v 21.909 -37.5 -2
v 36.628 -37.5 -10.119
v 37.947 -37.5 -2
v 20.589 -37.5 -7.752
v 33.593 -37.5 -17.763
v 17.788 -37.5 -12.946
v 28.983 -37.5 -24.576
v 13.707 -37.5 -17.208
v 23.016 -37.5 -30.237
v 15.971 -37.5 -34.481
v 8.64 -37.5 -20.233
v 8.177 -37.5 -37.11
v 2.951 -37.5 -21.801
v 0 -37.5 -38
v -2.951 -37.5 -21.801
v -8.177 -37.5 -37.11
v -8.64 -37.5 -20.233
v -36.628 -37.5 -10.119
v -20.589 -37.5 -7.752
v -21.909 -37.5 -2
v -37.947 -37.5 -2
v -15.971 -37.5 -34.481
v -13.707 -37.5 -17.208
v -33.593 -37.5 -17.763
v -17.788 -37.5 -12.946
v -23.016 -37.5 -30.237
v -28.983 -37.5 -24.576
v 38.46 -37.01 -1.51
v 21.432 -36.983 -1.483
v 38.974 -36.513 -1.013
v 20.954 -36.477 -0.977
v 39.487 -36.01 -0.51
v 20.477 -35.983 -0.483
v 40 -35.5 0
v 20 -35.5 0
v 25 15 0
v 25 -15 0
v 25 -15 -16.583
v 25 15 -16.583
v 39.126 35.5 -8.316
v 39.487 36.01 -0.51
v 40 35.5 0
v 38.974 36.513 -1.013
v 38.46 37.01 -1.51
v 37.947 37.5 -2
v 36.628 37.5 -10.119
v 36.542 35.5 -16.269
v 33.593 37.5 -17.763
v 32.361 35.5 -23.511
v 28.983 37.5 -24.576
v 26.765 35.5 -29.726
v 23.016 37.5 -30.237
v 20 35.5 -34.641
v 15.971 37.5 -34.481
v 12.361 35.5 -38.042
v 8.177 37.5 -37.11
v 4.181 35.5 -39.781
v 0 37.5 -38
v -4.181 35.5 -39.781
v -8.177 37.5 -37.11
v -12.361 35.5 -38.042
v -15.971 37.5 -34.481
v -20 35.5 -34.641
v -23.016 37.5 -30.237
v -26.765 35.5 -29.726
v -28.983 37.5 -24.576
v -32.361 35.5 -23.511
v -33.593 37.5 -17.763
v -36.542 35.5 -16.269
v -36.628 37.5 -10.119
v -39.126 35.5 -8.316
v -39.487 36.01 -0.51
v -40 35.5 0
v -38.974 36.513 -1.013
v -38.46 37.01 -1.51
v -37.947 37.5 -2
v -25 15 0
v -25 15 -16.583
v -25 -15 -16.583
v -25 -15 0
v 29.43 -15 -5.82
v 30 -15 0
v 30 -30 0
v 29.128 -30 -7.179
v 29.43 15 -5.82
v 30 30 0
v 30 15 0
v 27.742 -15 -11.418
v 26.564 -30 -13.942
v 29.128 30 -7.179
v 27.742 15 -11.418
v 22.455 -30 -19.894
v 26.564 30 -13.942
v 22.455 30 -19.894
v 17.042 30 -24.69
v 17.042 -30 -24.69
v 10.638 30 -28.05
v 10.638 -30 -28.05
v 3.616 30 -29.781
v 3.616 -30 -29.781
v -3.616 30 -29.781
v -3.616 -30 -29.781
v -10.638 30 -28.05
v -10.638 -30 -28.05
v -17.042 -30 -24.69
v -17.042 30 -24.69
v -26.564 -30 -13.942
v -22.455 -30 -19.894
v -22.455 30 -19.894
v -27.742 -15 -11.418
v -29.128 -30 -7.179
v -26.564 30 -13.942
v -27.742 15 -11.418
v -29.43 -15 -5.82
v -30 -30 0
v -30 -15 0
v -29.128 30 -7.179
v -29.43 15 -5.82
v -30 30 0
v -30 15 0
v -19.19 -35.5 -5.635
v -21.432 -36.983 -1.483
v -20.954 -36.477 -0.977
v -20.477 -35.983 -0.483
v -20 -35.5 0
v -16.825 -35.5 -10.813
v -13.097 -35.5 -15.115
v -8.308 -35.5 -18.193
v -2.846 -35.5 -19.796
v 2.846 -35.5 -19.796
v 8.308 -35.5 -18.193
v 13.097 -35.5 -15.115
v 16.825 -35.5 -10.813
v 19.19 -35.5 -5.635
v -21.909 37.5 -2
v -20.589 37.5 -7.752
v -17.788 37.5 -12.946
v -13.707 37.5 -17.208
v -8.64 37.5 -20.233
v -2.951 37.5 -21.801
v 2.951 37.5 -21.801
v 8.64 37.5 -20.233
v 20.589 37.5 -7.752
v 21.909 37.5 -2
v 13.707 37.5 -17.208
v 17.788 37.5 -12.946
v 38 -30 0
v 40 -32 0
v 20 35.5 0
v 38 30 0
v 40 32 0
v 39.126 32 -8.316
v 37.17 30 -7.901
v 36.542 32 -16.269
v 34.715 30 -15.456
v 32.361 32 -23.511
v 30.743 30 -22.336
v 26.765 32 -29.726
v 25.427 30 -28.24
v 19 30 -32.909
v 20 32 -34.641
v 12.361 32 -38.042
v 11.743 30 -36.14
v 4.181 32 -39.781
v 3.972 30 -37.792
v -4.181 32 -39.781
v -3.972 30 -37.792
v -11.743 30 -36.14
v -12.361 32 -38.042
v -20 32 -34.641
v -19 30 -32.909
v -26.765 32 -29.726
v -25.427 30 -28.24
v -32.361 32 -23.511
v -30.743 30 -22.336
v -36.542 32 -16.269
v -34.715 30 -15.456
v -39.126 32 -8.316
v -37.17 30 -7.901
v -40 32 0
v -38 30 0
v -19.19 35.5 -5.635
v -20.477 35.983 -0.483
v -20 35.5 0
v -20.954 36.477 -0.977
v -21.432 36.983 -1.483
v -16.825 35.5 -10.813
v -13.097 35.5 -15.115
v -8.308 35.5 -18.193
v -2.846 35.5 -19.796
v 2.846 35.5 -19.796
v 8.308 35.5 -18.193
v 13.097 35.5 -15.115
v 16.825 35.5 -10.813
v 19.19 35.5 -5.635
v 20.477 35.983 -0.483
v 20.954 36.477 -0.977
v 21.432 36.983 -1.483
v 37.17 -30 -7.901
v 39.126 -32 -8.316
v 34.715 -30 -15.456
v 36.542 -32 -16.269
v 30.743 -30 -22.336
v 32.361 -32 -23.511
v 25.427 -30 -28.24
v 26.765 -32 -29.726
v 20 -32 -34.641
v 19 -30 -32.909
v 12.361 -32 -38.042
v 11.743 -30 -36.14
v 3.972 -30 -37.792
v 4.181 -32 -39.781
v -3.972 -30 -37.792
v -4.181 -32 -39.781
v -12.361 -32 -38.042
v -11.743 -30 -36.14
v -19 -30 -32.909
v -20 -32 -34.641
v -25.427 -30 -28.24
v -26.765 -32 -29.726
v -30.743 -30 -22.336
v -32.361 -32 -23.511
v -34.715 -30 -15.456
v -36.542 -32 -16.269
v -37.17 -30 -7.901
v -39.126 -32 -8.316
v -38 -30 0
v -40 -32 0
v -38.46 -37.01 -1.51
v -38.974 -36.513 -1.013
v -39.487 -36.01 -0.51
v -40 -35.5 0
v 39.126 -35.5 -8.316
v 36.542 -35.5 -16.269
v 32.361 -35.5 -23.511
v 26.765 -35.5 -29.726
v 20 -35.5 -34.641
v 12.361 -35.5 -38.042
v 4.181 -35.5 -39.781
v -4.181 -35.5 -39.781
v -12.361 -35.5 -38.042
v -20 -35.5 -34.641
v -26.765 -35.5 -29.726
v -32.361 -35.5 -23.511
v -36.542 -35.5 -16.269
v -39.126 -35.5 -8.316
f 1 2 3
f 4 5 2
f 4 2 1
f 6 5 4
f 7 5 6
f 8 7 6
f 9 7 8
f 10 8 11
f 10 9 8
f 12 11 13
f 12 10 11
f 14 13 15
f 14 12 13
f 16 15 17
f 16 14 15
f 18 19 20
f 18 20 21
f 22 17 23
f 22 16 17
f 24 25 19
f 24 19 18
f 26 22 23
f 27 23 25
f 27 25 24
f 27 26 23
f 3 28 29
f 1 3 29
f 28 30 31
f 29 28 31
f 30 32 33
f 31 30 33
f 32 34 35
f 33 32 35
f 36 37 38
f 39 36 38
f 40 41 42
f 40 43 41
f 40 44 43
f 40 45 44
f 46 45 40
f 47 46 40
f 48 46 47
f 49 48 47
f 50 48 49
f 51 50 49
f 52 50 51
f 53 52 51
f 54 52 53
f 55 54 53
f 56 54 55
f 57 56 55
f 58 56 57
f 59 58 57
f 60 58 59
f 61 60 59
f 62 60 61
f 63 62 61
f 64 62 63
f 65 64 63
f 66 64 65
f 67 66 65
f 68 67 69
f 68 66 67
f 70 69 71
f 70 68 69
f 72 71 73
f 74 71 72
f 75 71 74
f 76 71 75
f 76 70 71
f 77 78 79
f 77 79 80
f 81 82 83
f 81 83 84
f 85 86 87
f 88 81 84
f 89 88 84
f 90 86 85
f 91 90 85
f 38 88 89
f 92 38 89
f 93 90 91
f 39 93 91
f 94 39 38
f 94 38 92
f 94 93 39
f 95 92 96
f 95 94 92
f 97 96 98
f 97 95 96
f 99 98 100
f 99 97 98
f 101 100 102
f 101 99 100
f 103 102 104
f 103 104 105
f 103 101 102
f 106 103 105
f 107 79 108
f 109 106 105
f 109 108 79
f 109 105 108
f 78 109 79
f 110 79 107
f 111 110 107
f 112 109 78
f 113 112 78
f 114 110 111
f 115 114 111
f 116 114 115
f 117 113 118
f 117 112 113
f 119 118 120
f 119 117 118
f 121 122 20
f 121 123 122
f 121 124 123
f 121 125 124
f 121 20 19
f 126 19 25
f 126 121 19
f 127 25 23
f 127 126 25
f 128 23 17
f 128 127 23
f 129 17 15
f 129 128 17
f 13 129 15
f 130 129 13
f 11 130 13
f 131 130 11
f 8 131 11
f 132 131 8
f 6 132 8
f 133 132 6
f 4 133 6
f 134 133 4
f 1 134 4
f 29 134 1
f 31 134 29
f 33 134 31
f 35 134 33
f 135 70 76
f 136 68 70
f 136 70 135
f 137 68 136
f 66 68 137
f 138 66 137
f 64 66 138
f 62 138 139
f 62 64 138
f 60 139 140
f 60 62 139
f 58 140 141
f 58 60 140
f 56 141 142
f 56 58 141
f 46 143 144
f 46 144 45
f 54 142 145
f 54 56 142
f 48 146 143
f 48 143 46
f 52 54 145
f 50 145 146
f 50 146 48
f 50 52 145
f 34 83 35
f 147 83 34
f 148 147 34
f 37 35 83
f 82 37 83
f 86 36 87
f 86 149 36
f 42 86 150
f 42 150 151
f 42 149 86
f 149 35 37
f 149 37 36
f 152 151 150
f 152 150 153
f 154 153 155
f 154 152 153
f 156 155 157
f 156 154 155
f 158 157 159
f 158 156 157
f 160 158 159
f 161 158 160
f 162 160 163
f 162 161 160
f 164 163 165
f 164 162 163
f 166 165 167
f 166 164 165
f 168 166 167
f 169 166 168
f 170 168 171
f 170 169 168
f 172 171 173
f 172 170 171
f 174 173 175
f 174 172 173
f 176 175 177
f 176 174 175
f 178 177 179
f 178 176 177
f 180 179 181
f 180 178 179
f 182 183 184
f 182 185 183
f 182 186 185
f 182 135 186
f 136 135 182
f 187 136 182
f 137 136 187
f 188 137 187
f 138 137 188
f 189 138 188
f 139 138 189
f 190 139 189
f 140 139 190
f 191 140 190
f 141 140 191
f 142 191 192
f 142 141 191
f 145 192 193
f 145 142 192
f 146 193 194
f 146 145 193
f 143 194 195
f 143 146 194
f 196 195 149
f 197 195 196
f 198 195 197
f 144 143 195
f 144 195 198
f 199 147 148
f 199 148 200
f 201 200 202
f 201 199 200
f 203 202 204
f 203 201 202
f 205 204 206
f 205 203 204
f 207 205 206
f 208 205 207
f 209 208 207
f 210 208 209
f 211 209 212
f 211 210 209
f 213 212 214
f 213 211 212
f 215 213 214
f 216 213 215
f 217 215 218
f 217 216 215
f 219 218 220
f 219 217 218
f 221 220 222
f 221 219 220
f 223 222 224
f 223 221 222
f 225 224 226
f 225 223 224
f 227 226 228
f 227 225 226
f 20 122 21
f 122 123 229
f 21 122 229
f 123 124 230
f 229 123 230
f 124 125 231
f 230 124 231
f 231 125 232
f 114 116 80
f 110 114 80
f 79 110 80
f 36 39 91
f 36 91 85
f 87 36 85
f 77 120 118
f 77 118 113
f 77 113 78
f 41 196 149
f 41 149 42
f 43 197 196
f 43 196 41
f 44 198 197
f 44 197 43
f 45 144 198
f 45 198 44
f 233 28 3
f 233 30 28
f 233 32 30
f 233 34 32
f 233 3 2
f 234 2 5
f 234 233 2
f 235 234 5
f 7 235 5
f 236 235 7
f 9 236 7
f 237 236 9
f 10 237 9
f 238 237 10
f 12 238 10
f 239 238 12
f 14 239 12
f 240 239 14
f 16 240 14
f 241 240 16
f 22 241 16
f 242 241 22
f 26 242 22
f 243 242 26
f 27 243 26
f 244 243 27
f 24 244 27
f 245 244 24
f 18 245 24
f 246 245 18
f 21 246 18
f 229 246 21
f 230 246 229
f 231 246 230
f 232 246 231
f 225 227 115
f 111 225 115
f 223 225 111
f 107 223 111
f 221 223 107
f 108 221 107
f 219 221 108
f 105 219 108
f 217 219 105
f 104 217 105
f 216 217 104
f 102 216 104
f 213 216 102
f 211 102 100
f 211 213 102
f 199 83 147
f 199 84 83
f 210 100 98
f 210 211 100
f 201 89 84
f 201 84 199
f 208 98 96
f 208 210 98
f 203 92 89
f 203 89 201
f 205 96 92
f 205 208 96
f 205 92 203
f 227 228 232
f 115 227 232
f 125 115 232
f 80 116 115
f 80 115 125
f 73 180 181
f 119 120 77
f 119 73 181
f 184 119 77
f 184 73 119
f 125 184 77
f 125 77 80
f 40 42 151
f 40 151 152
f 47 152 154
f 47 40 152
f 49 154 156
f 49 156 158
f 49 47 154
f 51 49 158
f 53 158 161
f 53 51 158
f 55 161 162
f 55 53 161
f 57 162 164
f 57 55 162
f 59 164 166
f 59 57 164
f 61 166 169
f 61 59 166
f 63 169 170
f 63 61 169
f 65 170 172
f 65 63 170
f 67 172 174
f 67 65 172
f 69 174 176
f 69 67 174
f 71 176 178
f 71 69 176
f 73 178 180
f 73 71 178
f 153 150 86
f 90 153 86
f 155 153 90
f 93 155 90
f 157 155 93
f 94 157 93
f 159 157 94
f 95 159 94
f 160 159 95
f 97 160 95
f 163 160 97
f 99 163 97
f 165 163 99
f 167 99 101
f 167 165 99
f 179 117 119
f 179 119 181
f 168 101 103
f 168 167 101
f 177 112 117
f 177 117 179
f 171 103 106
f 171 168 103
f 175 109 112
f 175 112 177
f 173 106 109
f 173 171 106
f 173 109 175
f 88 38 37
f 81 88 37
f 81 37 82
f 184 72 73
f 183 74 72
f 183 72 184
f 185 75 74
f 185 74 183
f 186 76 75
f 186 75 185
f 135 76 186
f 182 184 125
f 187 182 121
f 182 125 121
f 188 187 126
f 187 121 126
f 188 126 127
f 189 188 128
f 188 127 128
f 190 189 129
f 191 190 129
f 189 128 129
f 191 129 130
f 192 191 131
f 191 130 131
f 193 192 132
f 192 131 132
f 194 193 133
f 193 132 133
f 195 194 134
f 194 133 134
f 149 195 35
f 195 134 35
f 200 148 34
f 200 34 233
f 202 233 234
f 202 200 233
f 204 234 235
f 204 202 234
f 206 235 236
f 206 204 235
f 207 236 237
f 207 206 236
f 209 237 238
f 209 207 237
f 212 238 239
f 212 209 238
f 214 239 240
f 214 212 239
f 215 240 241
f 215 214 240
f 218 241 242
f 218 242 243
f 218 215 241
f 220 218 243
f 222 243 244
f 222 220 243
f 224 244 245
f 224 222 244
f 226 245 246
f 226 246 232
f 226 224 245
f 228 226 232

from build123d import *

# Parameters (mm, degrees)
REVOLVE_1_ANGLE     = 180
CUT_EXTRUDE_START   = -30
CUT_EXTRUDE_1_DEPTH = 30
CUT_EXTRUDE_2_DEPTH = 30
HOLE_WIZARD_M39_1_D = 40
CHAMFER_1_SIZE      = 2


with BuildPart() as part:
    # 草图1 → 旋转1 (revolve)
    with BuildSketch(Plane.XY):
        Polygon((0, 37.5), (0, -37.5), (40, -37.5), (40, -30), (30, -30), (30, 29.999999991), (40, 29.999999991), (40, 37.5), align=None)
    revolve(axis=Axis((0, 37.5, 0), (0, 1, 0)), revolution_arc=REVOLVE_1_ANGLE)

    # 草图2 → 切除-拉伸1 (cut)
    with BuildSketch(Plane.XZ.offset(15).offset(CUT_EXTRUDE_START)):
        with BuildLine():
            Line((25, 0), (25, -16.583123956))
            ThreePointArc((25, -16.583123956), (28.722813235, -8.66025404), (30.000000003, 0))
            Line((30.000000003, 0), (25, 0))
        make_face()
    extrude(amount=CUT_EXTRUDE_1_DEPTH, mode=Mode.SUBTRACT)

    # 草图3 → 切除-拉伸2 (cut)
    with BuildSketch(Plane.XZ.offset(15).offset(CUT_EXTRUDE_START)):
        with BuildLine():
            Line((-24.999999999, -16.583123954), (-24.999999999, 0))
            Line((-24.999999999, 0), (-30, 0))
            ThreePointArc((-30, 0), (-28.722813232, -8.660254039), (-24.999999999, -16.583123954))
        make_face()
    extrude(amount=CUT_EXTRUDE_2_DEPTH, mode=Mode.SUBTRACT)

    # M39 螺旋的螺纹孔钻头1 (through all)
    with Locations(Plane(origin=(0, 37.5, 0), x_dir=(1, 0, 0), z_dir=(0, 1, 0))):
        with Locations((0, 0)):
            Hole(HOLE_WIZARD_M39_1_D / 2)

    # 倒角1
    chamfer_1_edges = [part.edges().sort_by_distance(p)[0] for p in [
        (30, -37.5, 0),
        (0, 37.5, -40),
        (0, 29.999999991, -40),
        (0, -30, -40),
        (0, -37.5, -40),
        (-30, 37.5, 0),
        (-30, -37.5, 0),
        (30, 37.5, 0),
        (0, 37.5, -20),
        (0, -37.5, -20),
    ]]
    chamfer(chamfer_1_edges, length=CHAMFER_1_SIZE)


solid = part.part
